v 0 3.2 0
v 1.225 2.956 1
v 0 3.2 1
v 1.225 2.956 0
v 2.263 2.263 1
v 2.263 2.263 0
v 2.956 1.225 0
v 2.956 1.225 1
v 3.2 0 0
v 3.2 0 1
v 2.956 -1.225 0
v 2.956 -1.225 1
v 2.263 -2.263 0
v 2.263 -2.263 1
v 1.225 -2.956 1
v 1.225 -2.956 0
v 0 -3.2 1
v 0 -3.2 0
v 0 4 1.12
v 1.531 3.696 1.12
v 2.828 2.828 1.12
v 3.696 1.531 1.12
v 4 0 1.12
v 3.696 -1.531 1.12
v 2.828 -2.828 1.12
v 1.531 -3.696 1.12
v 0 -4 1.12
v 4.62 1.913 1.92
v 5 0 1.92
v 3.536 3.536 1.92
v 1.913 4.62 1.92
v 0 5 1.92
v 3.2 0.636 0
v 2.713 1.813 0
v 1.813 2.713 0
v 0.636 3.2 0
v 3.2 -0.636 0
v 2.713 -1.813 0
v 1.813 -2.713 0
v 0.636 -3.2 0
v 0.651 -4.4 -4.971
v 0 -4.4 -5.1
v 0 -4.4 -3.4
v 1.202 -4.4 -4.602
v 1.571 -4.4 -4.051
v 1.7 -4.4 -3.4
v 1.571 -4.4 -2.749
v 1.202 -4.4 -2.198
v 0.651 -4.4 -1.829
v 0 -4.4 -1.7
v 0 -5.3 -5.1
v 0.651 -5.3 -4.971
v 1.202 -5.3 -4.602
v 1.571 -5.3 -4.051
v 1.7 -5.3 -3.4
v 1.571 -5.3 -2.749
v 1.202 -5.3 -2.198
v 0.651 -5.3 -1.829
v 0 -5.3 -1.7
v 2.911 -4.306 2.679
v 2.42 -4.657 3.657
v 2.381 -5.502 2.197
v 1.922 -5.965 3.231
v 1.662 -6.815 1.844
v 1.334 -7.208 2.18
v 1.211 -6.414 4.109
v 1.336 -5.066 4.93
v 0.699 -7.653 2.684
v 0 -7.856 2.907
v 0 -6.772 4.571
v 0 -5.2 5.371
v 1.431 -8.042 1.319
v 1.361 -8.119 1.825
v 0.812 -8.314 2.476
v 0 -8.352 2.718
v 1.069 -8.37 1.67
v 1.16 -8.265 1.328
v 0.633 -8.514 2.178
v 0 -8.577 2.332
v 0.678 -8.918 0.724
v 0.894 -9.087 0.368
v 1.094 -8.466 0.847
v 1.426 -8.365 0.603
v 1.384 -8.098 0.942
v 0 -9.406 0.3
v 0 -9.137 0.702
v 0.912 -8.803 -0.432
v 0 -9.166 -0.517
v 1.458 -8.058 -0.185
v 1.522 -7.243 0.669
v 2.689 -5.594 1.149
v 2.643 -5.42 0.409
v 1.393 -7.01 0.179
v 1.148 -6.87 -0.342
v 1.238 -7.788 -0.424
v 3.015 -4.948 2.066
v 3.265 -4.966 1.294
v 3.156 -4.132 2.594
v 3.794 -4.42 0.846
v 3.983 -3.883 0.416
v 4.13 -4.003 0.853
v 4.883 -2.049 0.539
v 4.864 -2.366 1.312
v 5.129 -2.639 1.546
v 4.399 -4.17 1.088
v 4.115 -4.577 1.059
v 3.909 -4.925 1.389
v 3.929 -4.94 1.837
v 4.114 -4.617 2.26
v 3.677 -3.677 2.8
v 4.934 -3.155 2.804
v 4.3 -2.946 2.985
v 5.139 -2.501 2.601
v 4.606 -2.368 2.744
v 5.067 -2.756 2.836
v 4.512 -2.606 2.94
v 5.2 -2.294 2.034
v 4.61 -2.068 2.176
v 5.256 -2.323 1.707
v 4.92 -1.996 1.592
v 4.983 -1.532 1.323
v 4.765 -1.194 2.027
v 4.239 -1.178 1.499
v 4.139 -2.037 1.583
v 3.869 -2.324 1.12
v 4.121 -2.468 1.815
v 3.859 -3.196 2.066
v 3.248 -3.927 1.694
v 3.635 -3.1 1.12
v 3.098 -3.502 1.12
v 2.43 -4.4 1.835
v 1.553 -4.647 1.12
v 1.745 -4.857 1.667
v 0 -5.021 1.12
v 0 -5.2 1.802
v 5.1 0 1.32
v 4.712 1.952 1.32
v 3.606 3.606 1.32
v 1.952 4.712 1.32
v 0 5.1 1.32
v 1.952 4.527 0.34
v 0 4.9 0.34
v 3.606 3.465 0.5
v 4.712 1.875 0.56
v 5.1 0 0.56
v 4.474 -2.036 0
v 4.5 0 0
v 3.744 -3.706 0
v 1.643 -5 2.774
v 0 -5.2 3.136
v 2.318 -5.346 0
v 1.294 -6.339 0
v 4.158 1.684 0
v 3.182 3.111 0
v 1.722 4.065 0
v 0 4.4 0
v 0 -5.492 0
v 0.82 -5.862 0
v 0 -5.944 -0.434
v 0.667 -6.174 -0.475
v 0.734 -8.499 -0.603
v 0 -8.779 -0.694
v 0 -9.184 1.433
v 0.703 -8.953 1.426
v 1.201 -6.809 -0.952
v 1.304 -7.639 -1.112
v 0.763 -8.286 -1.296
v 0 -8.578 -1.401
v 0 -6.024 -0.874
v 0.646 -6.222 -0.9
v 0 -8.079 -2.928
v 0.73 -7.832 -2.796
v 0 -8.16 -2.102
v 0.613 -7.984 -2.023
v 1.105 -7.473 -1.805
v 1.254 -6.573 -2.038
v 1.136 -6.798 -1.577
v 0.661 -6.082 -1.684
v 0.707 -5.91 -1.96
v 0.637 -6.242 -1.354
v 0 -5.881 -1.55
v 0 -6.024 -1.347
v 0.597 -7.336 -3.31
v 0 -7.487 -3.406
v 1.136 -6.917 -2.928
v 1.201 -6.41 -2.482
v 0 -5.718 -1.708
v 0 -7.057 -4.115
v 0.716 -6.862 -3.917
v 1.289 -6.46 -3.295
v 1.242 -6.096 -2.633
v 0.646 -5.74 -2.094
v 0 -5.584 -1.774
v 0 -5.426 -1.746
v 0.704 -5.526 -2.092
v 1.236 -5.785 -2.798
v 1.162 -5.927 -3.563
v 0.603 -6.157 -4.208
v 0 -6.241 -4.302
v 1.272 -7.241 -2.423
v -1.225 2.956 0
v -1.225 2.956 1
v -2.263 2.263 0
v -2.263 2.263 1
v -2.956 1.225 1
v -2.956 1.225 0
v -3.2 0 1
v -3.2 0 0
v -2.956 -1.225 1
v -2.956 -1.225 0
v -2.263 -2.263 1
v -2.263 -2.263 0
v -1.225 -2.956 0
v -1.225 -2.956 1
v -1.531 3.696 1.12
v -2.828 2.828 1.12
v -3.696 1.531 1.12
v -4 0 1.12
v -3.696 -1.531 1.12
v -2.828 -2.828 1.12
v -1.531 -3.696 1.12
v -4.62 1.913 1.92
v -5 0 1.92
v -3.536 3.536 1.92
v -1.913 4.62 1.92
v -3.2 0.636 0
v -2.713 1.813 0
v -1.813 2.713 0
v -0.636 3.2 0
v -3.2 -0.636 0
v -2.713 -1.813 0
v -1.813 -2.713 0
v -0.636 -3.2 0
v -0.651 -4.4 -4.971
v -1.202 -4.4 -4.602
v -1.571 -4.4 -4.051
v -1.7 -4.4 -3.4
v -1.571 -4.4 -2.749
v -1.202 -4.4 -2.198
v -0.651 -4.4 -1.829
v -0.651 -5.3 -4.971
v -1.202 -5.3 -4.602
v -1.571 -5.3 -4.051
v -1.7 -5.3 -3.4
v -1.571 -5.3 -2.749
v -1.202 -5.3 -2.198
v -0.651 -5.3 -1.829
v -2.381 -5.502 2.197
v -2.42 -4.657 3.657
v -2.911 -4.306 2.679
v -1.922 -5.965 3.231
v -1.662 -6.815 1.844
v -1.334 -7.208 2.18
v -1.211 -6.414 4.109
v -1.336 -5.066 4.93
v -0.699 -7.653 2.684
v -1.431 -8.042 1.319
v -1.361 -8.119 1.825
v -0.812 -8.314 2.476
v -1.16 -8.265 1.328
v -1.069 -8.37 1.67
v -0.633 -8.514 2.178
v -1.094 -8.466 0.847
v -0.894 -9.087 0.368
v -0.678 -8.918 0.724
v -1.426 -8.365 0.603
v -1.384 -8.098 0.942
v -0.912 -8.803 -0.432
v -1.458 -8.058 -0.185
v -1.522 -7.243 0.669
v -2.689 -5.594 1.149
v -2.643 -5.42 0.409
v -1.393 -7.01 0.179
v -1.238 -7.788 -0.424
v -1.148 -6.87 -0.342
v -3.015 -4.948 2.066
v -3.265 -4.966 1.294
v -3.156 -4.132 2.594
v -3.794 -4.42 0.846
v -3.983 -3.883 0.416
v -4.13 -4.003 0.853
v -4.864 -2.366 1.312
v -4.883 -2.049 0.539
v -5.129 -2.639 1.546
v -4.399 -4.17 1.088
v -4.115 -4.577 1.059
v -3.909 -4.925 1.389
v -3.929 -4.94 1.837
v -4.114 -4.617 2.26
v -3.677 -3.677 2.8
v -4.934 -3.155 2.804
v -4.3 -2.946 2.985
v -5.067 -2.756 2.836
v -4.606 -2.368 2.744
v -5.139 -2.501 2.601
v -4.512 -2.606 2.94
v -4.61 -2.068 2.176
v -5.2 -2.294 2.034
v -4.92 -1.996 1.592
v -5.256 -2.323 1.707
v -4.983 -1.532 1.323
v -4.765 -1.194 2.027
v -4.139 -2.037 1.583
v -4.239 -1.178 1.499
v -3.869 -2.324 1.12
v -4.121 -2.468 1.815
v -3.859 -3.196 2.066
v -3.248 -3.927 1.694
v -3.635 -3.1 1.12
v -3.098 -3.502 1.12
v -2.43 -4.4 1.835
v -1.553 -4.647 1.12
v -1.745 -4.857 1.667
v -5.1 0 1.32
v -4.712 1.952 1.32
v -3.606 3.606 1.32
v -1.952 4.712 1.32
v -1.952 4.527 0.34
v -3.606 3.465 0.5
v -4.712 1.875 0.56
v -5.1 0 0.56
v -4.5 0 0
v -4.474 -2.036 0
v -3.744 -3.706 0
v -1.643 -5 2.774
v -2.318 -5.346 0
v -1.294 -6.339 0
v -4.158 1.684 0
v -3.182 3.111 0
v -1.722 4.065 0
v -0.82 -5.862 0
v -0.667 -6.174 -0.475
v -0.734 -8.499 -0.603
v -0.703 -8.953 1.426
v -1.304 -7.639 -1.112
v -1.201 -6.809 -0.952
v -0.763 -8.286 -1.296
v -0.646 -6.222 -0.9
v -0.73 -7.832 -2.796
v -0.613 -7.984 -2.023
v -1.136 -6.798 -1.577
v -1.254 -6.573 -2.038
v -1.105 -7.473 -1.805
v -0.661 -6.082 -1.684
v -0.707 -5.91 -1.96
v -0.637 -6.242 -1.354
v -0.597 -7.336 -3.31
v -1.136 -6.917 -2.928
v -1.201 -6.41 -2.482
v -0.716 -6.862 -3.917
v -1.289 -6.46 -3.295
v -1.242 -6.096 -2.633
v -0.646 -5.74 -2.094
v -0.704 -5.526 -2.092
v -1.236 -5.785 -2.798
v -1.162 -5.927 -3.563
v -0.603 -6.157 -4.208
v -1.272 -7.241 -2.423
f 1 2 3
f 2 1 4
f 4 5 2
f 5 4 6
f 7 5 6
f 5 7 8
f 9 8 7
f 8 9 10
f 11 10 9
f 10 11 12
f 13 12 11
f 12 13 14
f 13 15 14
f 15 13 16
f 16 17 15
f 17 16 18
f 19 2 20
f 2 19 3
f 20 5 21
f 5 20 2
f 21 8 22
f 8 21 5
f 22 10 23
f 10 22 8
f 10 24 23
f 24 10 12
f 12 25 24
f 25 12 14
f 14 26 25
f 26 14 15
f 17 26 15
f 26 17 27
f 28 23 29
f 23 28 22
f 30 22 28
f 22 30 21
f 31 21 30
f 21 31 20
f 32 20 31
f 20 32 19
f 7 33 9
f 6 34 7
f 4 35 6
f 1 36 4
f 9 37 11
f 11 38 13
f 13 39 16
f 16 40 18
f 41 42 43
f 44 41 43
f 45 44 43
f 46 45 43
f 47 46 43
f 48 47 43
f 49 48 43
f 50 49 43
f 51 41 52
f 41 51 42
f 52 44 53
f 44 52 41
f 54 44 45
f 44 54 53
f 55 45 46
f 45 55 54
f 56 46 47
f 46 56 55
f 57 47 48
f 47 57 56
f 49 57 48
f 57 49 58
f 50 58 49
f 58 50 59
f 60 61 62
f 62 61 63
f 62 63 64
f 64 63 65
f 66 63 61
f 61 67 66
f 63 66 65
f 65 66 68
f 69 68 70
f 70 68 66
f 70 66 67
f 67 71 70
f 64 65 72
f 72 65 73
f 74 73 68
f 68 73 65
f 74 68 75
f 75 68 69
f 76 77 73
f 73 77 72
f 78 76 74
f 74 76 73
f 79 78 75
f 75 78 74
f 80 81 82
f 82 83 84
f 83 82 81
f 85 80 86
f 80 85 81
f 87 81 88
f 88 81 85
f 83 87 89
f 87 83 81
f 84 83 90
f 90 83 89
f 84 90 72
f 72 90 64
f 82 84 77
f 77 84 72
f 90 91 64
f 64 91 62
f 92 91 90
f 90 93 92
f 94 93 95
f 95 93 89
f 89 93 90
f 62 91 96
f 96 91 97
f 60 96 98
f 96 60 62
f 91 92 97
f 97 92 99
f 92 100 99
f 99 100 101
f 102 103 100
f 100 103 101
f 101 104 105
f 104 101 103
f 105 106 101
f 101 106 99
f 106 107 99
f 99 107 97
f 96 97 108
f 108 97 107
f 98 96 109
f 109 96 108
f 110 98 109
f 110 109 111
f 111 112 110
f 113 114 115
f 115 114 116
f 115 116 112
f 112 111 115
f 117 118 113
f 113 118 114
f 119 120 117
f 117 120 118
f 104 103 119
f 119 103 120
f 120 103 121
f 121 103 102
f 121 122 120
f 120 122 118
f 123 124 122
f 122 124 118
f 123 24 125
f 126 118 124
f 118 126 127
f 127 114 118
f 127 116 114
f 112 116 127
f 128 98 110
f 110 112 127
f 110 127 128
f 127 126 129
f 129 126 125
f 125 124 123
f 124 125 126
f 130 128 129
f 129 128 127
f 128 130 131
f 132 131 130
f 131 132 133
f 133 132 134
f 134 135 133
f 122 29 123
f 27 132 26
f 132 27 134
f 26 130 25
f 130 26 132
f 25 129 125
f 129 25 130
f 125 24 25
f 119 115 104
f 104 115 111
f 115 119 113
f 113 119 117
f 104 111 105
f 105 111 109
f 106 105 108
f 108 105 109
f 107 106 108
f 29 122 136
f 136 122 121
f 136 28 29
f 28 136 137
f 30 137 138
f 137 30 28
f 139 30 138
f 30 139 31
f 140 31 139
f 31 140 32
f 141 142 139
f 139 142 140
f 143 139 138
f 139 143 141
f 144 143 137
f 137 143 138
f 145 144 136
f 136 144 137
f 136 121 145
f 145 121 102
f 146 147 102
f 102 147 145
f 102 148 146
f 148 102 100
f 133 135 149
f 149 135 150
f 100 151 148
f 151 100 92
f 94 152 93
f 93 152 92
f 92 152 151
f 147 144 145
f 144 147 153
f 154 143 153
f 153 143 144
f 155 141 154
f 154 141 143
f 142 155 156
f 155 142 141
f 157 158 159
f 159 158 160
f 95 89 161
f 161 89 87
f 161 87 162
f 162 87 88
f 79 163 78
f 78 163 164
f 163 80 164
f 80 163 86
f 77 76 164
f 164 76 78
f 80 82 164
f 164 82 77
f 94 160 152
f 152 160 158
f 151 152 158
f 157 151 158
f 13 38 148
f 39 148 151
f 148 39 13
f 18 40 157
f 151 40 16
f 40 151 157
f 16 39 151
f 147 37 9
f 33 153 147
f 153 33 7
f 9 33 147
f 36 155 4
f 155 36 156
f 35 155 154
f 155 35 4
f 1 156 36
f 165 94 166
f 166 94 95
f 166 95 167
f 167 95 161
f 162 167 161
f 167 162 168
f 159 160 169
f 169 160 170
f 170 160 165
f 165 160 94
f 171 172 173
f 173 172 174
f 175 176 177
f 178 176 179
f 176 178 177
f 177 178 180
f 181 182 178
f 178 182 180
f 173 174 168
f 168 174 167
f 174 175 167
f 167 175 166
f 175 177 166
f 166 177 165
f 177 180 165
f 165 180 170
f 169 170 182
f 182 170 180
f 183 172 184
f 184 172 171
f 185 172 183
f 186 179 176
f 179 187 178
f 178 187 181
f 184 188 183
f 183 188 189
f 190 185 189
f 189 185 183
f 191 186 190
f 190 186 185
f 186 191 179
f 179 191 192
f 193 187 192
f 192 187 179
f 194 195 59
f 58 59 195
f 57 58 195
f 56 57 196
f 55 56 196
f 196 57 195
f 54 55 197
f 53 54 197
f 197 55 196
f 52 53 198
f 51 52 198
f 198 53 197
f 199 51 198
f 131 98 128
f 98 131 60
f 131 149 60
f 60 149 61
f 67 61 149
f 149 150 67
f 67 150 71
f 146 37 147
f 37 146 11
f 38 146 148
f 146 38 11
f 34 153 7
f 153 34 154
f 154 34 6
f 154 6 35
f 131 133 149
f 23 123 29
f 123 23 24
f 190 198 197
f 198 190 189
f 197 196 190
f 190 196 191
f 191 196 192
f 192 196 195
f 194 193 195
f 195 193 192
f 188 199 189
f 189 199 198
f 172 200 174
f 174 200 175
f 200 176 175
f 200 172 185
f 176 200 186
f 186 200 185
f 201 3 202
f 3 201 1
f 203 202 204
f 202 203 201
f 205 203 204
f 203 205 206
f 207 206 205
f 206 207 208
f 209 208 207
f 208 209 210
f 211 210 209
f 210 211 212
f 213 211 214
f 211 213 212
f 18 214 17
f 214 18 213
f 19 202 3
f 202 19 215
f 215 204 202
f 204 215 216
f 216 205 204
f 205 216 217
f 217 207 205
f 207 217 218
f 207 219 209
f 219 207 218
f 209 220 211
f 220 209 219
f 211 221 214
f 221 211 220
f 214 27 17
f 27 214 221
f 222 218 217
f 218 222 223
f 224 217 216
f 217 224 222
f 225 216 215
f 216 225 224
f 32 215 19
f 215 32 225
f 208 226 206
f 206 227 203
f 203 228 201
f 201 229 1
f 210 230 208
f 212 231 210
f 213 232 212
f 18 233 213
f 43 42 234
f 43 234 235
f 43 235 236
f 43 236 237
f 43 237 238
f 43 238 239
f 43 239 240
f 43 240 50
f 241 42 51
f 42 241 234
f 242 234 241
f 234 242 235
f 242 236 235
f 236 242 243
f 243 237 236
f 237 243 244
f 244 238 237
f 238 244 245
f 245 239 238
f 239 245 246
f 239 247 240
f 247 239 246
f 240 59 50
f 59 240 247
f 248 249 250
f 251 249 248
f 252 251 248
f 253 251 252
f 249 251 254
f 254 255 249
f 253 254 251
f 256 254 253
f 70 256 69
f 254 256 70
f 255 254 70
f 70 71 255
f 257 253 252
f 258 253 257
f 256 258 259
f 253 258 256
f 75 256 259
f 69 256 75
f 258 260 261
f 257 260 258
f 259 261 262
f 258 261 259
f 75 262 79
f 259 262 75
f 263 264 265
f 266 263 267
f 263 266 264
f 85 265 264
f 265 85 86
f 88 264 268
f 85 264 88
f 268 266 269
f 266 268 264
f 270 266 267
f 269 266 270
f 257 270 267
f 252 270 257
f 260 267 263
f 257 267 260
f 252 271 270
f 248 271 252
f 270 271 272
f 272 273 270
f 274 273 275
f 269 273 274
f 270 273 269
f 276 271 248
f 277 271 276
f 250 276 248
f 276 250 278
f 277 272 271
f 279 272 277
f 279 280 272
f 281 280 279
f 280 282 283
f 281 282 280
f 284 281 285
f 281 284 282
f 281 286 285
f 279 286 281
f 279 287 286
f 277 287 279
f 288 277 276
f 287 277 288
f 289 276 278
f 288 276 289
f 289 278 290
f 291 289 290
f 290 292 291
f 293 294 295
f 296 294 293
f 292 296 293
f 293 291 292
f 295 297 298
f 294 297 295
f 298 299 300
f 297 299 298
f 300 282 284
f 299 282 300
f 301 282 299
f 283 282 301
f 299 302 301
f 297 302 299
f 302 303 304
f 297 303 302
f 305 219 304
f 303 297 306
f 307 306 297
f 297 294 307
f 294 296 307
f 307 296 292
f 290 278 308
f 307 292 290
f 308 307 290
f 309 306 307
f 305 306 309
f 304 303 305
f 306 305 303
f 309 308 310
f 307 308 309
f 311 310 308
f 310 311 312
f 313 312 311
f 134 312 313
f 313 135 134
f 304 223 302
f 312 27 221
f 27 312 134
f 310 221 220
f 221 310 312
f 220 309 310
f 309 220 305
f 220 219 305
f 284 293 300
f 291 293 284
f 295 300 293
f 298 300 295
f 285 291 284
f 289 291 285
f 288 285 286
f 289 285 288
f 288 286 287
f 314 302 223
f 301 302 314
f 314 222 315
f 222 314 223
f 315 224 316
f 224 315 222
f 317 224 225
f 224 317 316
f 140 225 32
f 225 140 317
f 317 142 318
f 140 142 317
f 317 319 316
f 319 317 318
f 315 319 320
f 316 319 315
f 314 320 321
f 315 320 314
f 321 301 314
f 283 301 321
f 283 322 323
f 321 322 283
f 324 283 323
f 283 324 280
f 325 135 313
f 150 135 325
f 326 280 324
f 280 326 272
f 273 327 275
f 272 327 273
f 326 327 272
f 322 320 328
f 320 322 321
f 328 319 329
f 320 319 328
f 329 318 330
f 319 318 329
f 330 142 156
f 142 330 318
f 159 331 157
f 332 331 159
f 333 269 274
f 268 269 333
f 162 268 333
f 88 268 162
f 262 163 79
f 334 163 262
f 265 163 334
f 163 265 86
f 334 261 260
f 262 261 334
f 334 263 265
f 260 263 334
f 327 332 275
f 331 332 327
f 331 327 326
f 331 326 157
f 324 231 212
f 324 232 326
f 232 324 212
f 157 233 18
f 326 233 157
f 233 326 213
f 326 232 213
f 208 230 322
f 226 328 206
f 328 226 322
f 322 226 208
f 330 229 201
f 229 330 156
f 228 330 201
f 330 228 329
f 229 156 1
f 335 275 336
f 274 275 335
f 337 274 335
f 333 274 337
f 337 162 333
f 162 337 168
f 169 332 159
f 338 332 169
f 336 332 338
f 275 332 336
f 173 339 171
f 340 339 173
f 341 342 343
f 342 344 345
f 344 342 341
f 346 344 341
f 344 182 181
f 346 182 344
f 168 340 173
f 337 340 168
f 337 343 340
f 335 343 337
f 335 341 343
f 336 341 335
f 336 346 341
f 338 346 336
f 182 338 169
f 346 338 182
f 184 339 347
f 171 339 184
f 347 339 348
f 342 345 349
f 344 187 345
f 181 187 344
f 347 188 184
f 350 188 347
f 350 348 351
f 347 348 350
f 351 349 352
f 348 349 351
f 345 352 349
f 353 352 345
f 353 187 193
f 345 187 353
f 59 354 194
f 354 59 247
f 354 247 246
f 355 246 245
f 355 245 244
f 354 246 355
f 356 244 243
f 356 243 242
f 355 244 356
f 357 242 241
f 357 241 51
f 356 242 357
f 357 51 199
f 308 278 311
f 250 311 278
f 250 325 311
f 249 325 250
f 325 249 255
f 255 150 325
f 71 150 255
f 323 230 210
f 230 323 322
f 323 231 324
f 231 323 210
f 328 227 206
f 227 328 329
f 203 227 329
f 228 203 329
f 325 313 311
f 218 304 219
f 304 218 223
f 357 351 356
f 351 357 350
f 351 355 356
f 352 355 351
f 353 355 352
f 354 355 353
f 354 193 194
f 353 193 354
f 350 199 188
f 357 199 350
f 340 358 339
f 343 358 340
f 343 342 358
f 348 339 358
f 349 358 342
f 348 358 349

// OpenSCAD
use <../lib.scad>
use <s/39796s01.scad>
function ldraw_lib__39796() = [
// 0 Minifig Aviator Oxygen Mask
// 0 Name: 39796.dat
// 0 Author: Vincent Messenet [Cheenzo]
// 0 !LDRAW_ORG Part UPDATE 2024-06
// 0 !LICENSE Licensed under CC BY 4.0 : see CAreadme.txt
// 
// 0 BFC CERTIFY CCW
  [0,"BFC","CERTIFY"],
  [0,"BFC","CCW"],
// 
// 0 !CATEGORY Minifig Neckwear
// 0 !KEYWORDS Breathing Apparatus
// 
// 0 !HISTORY 2021-04-28 {LEGO/Unity Microgame} Original part shape
// 0 !HISTORY 2023-03-10 [Cheenzo] File preparation for LDraw Parts Tracker
// 0 !HISTORY 2024-07-29 [OrionP] Official Update 2024-06
// 
// 1 16 0 0 0 1 0 0 0 1 0 0 0 1 s\39796s01.dat
  [1,16,0,0,0,1,0,0,0,1,0,0,0,1, ldraw_lib__s__39796s01()],
// 1 16 0 0 0 -1 0 0 0 1 0 0 0 1 s\39796s01.dat
  [1,16,0,0,0,-1,0,0,0,1,0,0,0,1, ldraw_lib__s__39796s01()],
// 5 24 0 -3.583 -22.961 0 -1.756 -22.842 -1.695 -1.81 -22.296 1.695 -1.81 -22.296
  [5,24,0,-3.583,-22.961,0,-1.756,-22.842,-1.695,-1.81,-22.296,1.695,-1.81,-22.296],
// 5 24 0 8.515 -18.717 0 10.287 -17.643 1.492 8.274 -18.339 -1.492 8.274 -18.339
  [5,24,0,8.515,-18.717,0,10.287,-17.643,1.492,8.274,-18.339,-1.492,8.274,-18.339],
// 5 24 0 4.25 -13.25 0 4.365 -13.564 -1.759 5.23 -13.816 1.759 5.23 -13.816
  [5,24,0,4.25,-13.25,0,4.365,-13.564,-1.759,5.23,-13.816,1.759,5.23,-13.816],
// 5 24 0 4.269 -14.295 0 3.876 -14.703 1.653 4.21 -15.204 -1.653 4.21 -15.204
  [5,24,0,4.269,-14.295,0,3.876,-14.703,1.653,4.21,-15.204,-1.653,4.21,-15.204],
// 5 24 0 -5.831 -21.443 0 -3.583 -22.961 -1.583 -5.444 -21.284 1.583 -5.444 -21.284
  [5,24,0,-5.831,-21.443,0,-3.583,-22.961,-1.583,-5.444,-21.284,1.583,-5.444,-21.284],
// 5 24 0 3.876 -14.703 0 3.368 -15.061 -1.653 4.21 -15.204 1.653 4.21 -15.204
  [5,24,0,3.876,-14.703,0,3.368,-15.061,-1.653,4.21,-15.204,1.653,4.21,-15.204],
// 5 24 0 -11.427 -16.929 0 -7.267 -19.64 1.747 -6.711 -19.133 -1.747 -6.711 -19.133
  [5,24,0,-11.427,-16.929,0,-7.267,-19.64,1.747,-6.711,-19.133,-1.747,-6.711,-19.133],
// 5 24 0 -.85 12.25 0 -3.3 12.75 -4.879 -3.3 11.78 4.879 -3.3 11.78
  [5,24,0,-.85,12.25,0,-3.3,12.75,-4.879,-3.3,11.78,4.879,-3.3,11.78],
// 5 24 0 -1.756 -22.842 0 -.751 -23.516 -2.236 -.92 -22.718 2.236 -.92 -22.718
  [5,24,0,-1.756,-22.842,0,-.751,-23.516,-2.236,-.92,-22.718,2.236,-.92,-22.718],
// 5 24 0 -6.796 -20.88 0 -5.831 -21.443 -1.583 -5.444 -21.284 1.583 -5.444 -21.284
  [5,24,0,-6.796,-20.88,0,-5.831,-21.443,-1.583,-5.444,-21.284,1.583,-5.444,-21.284],
// 5 24 0 -13.428 -13 0 -11.427 -16.929 -3.339 -12.326 -12.666 3.339 -12.326 -12.666
  [5,24,0,-13.428,-13,0,-11.427,-16.929,-3.339,-12.326,-12.666,3.339,-12.326,-12.666],
// 5 24 0 4.365 -13.564 0 4.434 -13.959 -1.759 5.23 -13.816 1.759 5.23 -13.816
  [5,24,0,4.365,-13.564,0,4.434,-13.959,-1.759,5.23,-13.816,1.759,5.23,-13.816],
// 5 24 0 5.254 -20.401 0 7.321 -20.197 -1.825 6.991 -19.58 1.825 6.991 -19.58
  [5,24,0,5.254,-20.401,0,7.321,-20.197,-1.825,6.991,-19.58,1.825,6.991,-19.58],
// 5 24 0 0 11 0 -.85 12.25 4.879 -.85 11.318 -4.879 -.85 11.318
  [5,24,0,0,11,0,-.85,12.25,4.879,-.85,11.318,-4.879,-.85,11.318],
// 5 24 0 10.287 -17.643 0 10.754 -15.603 -1.791 9.792 -17.156 1.791 9.792 -17.156
  [5,24,0,10.287,-17.643,0,10.754,-15.603,-1.791,9.792,-17.156,1.791,9.792,-17.156],
// 5 24 0 -7.267 -19.64 0 -6.796 -20.88 1.747 -6.711 -19.133 -1.747 -6.711 -19.133
  [5,24,0,-7.267,-19.64,0,-6.796,-20.88,1.747,-6.711,-19.133,-1.747,-6.711,-19.133],
// 5 24 0 3.368 -15.061 0 2.184 -15.06 1.614 2.251 -15.555 -1.614 2.251 -15.555
  [5,24,0,3.368,-15.061,0,2.184,-15.06,1.614,2.251,-15.555,-1.614,2.251,-15.555],
// 5 24 0 2.184 -15.06 0 1.086 -14.861 1.668 1.187 -15.434 -1.668 1.187 -15.434
  [5,24,0,2.184,-15.06,0,1.086,-14.861,1.668,1.187,-15.434,-1.668,1.187,-15.434],
// 5 24 0 3.502 -21.445 0 5.254 -20.401 -1.532 5.058 -19.961 1.532 5.058 -19.961
  [5,24,0,3.502,-21.445,0,5.254,-20.401,-1.532,5.058,-19.961,1.532,5.058,-19.961],
// 5 24 0 -.751 -23.516 0 1.293 -22.914 -2.236 -.92 -22.718 2.236 -.92 -22.718
  [5,24,0,-.751,-23.516,0,1.293,-22.914,-2.236,-.92,-22.718,2.236,-.92,-22.718],
// 5 24 0 -3.3 12.75 0 -4.8 12.5 -4.78375 -4.8 11.54875 4.78375 -4.8 11.54875
  [5,24,0,-3.3,12.75,0,-4.8,12.5,-4.78375,-4.8,11.54875,4.78375,-4.8,11.54875],
// 5 24 0 -2.8 -12.552 0 -4.505 -13 4.363 -4.168 -12.143 -4.363 -4.168 -12.143
  [5,24,0,-2.8,-12.552,0,-4.505,-13,4.363,-4.168,-12.143,-4.363,-4.168,-12.143],
// 5 24 0 7.321 -20.197 0 8.515 -18.717 -1.825 6.991 -19.58 1.825 6.991 -19.58
  [5,24,0,7.321,-20.197,0,8.515,-18.717,-1.825,6.991,-19.58,1.825,6.991,-19.58],
// 5 24 0 4.434 -13.959 0 4.269 -14.295 -1.616 5.236 -14.349 1.616 5.236 -14.349
  [5,24,0,4.434,-13.959,0,4.269,-14.295,-1.616,5.236,-14.349,1.616,5.236,-14.349],
// 5 24 0 1.086 -14.861 0 0 -13.729 2.051 0 -14.654 -2.051 0 -14.654
  [5,24,0,1.086,-14.861,0,0,-13.729,2.051,0,-14.654,-2.051,0,-14.654],
// 5 24 0 1.293 -22.914 0 1.735 -21.948 -2.279 1.079 -22.007 2.279 1.079 -22.007
  [5,24,0,1.293,-22.914,0,1.735,-21.948,-2.279,1.079,-22.007,2.279,1.079,-22.007],
// 5 24 0 -7.841 -13 0 -13.428 -13 3.339 -12.326 -12.666 -3.339 -12.326 -12.666
  [5,24,0,-7.841,-13,0,-13.428,-13,3.339,-12.326,-12.666,-3.339,-12.326,-12.666],
// 5 24 0 10.754 -15.603 0 12.75 -13.25 1.507 10.521 -15.393 -1.507 10.521 -15.393
  [5,24,0,10.754,-15.603,0,12.75,-13.25,1.507,10.521,-15.393,-1.507,10.521,-15.393],
// 5 24 0 -4.505 -13 0 -7.841 -13 4.108 -6.935 -12.5 -4.108 -6.935 -12.5
  [5,24,0,-4.505,-13,0,-7.841,-13,4.108,-6.935,-12.5,-4.108,-6.935,-12.5],
// 5 24 0 1.735 -21.948 0 3.502 -21.445 1.907 3.24 -20.714 -1.907 3.24 -20.714
  [5,24,0,1.735,-21.948,0,3.502,-21.445,1.907,3.24,-20.714,-1.907,3.24,-20.714],
];
module ldraw_lib__39796(step=0, col=false, unit=2/5, alt=false, line=0.2, solid=!$preview)
    makepoly(ldraw_lib__39796(), step=step, col=col, unit=unit, alt=alt, line=line, solid=solid);
ldraw_lib__39796(line=0.2);
